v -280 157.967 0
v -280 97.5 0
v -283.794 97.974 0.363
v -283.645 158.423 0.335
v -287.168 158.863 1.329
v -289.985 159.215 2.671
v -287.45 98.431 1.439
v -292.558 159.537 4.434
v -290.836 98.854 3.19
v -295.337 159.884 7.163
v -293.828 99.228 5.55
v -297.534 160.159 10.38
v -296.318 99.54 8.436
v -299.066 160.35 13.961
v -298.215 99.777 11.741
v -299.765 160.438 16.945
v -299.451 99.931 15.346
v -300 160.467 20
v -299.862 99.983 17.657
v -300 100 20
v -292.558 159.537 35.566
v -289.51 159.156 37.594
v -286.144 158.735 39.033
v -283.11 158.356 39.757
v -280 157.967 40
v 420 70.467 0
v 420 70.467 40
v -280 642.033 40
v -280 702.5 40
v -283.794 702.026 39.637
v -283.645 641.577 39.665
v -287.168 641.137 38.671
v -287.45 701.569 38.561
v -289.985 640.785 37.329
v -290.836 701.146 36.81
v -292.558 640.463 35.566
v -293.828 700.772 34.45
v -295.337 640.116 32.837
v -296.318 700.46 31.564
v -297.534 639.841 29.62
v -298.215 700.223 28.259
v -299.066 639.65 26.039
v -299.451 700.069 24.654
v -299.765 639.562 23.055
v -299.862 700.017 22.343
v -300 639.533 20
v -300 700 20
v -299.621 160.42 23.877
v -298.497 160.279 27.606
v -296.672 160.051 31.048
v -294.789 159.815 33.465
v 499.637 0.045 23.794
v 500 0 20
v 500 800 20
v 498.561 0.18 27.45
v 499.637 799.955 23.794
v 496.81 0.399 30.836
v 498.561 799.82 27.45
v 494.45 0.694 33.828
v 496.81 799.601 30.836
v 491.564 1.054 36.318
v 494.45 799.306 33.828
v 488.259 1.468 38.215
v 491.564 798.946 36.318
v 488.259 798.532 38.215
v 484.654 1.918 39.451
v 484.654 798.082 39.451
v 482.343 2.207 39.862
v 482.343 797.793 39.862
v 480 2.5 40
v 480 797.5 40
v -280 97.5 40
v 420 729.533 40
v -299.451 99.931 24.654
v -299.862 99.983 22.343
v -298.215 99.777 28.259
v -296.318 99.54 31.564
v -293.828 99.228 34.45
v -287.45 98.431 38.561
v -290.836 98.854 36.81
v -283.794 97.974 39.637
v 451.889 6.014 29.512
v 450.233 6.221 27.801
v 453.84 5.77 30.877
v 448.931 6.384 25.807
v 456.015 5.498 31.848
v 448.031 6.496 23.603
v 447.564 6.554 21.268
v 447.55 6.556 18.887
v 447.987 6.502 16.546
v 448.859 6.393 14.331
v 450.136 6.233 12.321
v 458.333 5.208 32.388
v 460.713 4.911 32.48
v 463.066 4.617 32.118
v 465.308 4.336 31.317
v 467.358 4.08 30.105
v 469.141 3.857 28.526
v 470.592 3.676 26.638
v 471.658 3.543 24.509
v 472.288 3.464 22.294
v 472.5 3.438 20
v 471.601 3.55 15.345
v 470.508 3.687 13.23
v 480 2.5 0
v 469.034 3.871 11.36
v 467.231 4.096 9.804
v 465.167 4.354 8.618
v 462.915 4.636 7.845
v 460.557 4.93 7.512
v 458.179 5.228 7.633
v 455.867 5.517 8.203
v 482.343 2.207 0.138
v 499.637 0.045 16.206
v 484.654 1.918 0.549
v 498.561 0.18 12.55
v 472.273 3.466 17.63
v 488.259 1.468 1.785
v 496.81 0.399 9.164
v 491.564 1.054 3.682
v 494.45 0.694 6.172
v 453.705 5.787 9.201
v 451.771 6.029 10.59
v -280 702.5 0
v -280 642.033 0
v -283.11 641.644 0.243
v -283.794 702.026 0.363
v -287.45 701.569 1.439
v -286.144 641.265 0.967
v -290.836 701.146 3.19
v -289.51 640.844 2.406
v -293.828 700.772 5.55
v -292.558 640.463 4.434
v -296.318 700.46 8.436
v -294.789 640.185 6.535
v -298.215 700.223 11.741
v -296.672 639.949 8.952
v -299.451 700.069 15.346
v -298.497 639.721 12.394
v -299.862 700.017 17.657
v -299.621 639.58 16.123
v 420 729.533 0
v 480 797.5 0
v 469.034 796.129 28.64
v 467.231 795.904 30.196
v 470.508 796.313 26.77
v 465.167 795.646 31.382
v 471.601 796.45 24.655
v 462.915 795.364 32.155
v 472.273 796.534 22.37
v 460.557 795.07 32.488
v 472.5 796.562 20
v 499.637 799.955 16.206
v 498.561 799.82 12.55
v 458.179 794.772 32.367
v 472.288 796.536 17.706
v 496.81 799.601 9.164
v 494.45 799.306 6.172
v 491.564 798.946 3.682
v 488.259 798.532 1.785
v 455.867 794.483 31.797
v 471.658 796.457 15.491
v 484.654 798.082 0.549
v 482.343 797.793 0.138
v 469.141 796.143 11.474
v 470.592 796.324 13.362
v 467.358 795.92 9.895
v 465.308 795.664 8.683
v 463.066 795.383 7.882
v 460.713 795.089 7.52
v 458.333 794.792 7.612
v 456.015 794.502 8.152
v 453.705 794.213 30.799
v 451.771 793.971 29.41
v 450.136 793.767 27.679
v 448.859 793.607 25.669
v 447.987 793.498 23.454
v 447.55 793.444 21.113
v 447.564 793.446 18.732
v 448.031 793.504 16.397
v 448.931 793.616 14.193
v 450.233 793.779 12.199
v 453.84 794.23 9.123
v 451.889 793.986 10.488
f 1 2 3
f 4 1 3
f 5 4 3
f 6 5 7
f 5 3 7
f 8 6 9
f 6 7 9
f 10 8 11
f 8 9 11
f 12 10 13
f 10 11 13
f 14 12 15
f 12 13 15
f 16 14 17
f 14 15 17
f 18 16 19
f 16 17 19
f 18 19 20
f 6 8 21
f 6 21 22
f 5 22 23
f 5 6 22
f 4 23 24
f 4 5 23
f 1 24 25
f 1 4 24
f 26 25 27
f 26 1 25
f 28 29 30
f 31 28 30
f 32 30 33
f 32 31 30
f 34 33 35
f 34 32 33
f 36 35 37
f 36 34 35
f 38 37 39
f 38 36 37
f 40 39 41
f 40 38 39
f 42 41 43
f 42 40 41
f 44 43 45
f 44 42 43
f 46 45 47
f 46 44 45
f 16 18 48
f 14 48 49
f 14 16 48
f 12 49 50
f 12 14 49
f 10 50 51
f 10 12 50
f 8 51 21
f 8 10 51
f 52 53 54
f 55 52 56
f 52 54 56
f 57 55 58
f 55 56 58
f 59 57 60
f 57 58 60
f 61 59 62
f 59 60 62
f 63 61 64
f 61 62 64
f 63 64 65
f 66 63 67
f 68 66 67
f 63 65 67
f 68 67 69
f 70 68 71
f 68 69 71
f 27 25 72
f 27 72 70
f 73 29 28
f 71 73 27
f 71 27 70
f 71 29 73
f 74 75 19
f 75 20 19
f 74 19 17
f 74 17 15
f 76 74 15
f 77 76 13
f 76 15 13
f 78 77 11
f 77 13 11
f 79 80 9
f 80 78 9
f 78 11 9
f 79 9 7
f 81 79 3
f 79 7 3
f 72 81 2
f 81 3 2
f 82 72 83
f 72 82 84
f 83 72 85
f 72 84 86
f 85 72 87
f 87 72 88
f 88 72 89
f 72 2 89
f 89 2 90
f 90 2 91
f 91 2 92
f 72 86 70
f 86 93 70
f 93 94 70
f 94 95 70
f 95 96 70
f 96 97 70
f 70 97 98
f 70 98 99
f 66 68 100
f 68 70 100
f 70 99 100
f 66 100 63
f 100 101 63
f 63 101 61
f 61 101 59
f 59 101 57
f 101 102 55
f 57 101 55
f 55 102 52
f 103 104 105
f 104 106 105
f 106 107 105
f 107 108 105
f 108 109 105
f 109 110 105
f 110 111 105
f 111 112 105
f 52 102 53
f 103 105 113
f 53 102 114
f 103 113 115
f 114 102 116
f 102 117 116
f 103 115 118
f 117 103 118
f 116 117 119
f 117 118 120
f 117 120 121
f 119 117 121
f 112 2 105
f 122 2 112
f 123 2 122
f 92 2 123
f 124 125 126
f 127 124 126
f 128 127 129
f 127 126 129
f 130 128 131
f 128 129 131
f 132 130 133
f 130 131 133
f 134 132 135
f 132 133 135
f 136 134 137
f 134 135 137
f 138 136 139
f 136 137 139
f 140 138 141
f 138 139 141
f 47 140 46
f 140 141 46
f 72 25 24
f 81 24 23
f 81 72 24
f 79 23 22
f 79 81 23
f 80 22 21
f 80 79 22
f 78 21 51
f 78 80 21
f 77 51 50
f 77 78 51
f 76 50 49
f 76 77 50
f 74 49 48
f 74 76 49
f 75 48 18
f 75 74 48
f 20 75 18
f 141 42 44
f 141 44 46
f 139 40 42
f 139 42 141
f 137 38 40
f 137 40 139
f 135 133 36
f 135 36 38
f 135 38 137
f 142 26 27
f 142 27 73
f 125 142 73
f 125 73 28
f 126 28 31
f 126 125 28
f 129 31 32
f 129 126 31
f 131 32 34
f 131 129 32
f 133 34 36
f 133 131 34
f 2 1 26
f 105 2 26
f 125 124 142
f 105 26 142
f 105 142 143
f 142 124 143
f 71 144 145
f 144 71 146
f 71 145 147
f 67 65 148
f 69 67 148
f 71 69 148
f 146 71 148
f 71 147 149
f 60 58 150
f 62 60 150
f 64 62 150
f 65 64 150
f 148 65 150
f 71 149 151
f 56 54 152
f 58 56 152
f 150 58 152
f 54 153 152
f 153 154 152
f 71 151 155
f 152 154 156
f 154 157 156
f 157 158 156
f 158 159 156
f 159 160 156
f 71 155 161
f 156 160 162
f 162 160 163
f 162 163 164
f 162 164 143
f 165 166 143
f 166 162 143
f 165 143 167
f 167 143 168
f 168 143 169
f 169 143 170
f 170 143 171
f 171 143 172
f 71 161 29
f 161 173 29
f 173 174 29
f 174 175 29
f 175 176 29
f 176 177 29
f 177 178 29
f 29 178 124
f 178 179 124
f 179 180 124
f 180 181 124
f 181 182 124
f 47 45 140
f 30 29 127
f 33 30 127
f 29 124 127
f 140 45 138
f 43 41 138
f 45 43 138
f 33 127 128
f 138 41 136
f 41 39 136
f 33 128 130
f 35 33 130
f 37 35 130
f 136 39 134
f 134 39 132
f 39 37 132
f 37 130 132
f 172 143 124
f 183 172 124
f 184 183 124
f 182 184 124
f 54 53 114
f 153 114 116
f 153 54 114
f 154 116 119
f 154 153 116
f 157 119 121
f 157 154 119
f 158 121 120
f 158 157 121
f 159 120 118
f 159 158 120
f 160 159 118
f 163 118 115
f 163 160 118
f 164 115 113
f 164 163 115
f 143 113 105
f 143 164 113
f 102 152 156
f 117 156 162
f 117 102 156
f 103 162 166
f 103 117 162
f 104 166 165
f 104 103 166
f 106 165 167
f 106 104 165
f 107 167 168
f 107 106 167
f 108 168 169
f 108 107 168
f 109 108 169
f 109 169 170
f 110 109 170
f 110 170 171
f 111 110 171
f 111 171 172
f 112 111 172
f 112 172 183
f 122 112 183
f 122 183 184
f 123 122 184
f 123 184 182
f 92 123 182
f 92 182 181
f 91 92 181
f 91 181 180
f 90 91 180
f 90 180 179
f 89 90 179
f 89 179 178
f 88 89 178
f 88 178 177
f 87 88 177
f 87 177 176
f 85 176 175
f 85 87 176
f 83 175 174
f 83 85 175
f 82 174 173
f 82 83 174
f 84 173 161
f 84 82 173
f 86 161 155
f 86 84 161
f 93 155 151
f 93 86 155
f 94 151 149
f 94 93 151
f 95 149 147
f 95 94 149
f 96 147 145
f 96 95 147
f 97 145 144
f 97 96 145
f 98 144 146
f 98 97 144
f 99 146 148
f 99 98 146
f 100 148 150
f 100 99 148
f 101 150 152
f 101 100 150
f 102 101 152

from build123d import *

# Parameters (mm, degrees)
BOSS_EXTRU_1_DEPTH      = 40
ESQUISSE2_R             = 12.5
ENL_V_MAT_EXTRU_1_DEPTH = 945.245730729
CONG_1_R                = 20
ENL_V_MAT_EXTRU_4_DEPTH = 945.245730729


with BuildPart() as part:
    # Esquisse1 → Boss.-Extru.1 (new body)
    with BuildSketch(Plane.XY):
        Polygon((500, 0), (500, 800), (-300, 700), (-300, 100), align=None)
    extrude(amount=BOSS_EXTRU_1_DEPTH)

    # Esquisse2 → Enlèv. mat.-Extru.1 (cut, through all)
    with BuildSketch(Plane(origin=(0, 0, 0), x_dir=(1, 0, 0), z_dir=(0, 1, 0))):
        with Locations((460, -20)):
            Circle(ESQUISSE2_R)
    extrude(amount=ENL_V_MAT_EXTRU_1_DEPTH, mode=Mode.SUBTRACT)

    # Congé1
    cong_1_edges = [part.edges().sort_by_distance(p)[0] for p in [
        (-300, 400, 0),
        (-300, 400, 40),
        (500, 400, 0),
        (500, 400, 40),
    ]]
    fillet(cong_1_edges, radius=CONG_1_R - 0.0001)  # a hair under: the kernel refuses the full size

    # Esquisse3 → Enlèv. mat.-Extru.4 (cut, through all)
    with BuildSketch(Plane.XY):
        Polygon((-300, 639.533066888), (-300, 160.466933112), (-292.557915925, 159.536672603), (-272.557915925, 157.036672603), (420, 70.466933112), (420, 729.533066888), (-272.557915925, 642.963327397), (-292.557915925, 640.463327397), align=None)
    extrude(amount=ENL_V_MAT_EXTRU_4_DEPTH, mode=Mode.SUBTRACT)


solid = part.part
